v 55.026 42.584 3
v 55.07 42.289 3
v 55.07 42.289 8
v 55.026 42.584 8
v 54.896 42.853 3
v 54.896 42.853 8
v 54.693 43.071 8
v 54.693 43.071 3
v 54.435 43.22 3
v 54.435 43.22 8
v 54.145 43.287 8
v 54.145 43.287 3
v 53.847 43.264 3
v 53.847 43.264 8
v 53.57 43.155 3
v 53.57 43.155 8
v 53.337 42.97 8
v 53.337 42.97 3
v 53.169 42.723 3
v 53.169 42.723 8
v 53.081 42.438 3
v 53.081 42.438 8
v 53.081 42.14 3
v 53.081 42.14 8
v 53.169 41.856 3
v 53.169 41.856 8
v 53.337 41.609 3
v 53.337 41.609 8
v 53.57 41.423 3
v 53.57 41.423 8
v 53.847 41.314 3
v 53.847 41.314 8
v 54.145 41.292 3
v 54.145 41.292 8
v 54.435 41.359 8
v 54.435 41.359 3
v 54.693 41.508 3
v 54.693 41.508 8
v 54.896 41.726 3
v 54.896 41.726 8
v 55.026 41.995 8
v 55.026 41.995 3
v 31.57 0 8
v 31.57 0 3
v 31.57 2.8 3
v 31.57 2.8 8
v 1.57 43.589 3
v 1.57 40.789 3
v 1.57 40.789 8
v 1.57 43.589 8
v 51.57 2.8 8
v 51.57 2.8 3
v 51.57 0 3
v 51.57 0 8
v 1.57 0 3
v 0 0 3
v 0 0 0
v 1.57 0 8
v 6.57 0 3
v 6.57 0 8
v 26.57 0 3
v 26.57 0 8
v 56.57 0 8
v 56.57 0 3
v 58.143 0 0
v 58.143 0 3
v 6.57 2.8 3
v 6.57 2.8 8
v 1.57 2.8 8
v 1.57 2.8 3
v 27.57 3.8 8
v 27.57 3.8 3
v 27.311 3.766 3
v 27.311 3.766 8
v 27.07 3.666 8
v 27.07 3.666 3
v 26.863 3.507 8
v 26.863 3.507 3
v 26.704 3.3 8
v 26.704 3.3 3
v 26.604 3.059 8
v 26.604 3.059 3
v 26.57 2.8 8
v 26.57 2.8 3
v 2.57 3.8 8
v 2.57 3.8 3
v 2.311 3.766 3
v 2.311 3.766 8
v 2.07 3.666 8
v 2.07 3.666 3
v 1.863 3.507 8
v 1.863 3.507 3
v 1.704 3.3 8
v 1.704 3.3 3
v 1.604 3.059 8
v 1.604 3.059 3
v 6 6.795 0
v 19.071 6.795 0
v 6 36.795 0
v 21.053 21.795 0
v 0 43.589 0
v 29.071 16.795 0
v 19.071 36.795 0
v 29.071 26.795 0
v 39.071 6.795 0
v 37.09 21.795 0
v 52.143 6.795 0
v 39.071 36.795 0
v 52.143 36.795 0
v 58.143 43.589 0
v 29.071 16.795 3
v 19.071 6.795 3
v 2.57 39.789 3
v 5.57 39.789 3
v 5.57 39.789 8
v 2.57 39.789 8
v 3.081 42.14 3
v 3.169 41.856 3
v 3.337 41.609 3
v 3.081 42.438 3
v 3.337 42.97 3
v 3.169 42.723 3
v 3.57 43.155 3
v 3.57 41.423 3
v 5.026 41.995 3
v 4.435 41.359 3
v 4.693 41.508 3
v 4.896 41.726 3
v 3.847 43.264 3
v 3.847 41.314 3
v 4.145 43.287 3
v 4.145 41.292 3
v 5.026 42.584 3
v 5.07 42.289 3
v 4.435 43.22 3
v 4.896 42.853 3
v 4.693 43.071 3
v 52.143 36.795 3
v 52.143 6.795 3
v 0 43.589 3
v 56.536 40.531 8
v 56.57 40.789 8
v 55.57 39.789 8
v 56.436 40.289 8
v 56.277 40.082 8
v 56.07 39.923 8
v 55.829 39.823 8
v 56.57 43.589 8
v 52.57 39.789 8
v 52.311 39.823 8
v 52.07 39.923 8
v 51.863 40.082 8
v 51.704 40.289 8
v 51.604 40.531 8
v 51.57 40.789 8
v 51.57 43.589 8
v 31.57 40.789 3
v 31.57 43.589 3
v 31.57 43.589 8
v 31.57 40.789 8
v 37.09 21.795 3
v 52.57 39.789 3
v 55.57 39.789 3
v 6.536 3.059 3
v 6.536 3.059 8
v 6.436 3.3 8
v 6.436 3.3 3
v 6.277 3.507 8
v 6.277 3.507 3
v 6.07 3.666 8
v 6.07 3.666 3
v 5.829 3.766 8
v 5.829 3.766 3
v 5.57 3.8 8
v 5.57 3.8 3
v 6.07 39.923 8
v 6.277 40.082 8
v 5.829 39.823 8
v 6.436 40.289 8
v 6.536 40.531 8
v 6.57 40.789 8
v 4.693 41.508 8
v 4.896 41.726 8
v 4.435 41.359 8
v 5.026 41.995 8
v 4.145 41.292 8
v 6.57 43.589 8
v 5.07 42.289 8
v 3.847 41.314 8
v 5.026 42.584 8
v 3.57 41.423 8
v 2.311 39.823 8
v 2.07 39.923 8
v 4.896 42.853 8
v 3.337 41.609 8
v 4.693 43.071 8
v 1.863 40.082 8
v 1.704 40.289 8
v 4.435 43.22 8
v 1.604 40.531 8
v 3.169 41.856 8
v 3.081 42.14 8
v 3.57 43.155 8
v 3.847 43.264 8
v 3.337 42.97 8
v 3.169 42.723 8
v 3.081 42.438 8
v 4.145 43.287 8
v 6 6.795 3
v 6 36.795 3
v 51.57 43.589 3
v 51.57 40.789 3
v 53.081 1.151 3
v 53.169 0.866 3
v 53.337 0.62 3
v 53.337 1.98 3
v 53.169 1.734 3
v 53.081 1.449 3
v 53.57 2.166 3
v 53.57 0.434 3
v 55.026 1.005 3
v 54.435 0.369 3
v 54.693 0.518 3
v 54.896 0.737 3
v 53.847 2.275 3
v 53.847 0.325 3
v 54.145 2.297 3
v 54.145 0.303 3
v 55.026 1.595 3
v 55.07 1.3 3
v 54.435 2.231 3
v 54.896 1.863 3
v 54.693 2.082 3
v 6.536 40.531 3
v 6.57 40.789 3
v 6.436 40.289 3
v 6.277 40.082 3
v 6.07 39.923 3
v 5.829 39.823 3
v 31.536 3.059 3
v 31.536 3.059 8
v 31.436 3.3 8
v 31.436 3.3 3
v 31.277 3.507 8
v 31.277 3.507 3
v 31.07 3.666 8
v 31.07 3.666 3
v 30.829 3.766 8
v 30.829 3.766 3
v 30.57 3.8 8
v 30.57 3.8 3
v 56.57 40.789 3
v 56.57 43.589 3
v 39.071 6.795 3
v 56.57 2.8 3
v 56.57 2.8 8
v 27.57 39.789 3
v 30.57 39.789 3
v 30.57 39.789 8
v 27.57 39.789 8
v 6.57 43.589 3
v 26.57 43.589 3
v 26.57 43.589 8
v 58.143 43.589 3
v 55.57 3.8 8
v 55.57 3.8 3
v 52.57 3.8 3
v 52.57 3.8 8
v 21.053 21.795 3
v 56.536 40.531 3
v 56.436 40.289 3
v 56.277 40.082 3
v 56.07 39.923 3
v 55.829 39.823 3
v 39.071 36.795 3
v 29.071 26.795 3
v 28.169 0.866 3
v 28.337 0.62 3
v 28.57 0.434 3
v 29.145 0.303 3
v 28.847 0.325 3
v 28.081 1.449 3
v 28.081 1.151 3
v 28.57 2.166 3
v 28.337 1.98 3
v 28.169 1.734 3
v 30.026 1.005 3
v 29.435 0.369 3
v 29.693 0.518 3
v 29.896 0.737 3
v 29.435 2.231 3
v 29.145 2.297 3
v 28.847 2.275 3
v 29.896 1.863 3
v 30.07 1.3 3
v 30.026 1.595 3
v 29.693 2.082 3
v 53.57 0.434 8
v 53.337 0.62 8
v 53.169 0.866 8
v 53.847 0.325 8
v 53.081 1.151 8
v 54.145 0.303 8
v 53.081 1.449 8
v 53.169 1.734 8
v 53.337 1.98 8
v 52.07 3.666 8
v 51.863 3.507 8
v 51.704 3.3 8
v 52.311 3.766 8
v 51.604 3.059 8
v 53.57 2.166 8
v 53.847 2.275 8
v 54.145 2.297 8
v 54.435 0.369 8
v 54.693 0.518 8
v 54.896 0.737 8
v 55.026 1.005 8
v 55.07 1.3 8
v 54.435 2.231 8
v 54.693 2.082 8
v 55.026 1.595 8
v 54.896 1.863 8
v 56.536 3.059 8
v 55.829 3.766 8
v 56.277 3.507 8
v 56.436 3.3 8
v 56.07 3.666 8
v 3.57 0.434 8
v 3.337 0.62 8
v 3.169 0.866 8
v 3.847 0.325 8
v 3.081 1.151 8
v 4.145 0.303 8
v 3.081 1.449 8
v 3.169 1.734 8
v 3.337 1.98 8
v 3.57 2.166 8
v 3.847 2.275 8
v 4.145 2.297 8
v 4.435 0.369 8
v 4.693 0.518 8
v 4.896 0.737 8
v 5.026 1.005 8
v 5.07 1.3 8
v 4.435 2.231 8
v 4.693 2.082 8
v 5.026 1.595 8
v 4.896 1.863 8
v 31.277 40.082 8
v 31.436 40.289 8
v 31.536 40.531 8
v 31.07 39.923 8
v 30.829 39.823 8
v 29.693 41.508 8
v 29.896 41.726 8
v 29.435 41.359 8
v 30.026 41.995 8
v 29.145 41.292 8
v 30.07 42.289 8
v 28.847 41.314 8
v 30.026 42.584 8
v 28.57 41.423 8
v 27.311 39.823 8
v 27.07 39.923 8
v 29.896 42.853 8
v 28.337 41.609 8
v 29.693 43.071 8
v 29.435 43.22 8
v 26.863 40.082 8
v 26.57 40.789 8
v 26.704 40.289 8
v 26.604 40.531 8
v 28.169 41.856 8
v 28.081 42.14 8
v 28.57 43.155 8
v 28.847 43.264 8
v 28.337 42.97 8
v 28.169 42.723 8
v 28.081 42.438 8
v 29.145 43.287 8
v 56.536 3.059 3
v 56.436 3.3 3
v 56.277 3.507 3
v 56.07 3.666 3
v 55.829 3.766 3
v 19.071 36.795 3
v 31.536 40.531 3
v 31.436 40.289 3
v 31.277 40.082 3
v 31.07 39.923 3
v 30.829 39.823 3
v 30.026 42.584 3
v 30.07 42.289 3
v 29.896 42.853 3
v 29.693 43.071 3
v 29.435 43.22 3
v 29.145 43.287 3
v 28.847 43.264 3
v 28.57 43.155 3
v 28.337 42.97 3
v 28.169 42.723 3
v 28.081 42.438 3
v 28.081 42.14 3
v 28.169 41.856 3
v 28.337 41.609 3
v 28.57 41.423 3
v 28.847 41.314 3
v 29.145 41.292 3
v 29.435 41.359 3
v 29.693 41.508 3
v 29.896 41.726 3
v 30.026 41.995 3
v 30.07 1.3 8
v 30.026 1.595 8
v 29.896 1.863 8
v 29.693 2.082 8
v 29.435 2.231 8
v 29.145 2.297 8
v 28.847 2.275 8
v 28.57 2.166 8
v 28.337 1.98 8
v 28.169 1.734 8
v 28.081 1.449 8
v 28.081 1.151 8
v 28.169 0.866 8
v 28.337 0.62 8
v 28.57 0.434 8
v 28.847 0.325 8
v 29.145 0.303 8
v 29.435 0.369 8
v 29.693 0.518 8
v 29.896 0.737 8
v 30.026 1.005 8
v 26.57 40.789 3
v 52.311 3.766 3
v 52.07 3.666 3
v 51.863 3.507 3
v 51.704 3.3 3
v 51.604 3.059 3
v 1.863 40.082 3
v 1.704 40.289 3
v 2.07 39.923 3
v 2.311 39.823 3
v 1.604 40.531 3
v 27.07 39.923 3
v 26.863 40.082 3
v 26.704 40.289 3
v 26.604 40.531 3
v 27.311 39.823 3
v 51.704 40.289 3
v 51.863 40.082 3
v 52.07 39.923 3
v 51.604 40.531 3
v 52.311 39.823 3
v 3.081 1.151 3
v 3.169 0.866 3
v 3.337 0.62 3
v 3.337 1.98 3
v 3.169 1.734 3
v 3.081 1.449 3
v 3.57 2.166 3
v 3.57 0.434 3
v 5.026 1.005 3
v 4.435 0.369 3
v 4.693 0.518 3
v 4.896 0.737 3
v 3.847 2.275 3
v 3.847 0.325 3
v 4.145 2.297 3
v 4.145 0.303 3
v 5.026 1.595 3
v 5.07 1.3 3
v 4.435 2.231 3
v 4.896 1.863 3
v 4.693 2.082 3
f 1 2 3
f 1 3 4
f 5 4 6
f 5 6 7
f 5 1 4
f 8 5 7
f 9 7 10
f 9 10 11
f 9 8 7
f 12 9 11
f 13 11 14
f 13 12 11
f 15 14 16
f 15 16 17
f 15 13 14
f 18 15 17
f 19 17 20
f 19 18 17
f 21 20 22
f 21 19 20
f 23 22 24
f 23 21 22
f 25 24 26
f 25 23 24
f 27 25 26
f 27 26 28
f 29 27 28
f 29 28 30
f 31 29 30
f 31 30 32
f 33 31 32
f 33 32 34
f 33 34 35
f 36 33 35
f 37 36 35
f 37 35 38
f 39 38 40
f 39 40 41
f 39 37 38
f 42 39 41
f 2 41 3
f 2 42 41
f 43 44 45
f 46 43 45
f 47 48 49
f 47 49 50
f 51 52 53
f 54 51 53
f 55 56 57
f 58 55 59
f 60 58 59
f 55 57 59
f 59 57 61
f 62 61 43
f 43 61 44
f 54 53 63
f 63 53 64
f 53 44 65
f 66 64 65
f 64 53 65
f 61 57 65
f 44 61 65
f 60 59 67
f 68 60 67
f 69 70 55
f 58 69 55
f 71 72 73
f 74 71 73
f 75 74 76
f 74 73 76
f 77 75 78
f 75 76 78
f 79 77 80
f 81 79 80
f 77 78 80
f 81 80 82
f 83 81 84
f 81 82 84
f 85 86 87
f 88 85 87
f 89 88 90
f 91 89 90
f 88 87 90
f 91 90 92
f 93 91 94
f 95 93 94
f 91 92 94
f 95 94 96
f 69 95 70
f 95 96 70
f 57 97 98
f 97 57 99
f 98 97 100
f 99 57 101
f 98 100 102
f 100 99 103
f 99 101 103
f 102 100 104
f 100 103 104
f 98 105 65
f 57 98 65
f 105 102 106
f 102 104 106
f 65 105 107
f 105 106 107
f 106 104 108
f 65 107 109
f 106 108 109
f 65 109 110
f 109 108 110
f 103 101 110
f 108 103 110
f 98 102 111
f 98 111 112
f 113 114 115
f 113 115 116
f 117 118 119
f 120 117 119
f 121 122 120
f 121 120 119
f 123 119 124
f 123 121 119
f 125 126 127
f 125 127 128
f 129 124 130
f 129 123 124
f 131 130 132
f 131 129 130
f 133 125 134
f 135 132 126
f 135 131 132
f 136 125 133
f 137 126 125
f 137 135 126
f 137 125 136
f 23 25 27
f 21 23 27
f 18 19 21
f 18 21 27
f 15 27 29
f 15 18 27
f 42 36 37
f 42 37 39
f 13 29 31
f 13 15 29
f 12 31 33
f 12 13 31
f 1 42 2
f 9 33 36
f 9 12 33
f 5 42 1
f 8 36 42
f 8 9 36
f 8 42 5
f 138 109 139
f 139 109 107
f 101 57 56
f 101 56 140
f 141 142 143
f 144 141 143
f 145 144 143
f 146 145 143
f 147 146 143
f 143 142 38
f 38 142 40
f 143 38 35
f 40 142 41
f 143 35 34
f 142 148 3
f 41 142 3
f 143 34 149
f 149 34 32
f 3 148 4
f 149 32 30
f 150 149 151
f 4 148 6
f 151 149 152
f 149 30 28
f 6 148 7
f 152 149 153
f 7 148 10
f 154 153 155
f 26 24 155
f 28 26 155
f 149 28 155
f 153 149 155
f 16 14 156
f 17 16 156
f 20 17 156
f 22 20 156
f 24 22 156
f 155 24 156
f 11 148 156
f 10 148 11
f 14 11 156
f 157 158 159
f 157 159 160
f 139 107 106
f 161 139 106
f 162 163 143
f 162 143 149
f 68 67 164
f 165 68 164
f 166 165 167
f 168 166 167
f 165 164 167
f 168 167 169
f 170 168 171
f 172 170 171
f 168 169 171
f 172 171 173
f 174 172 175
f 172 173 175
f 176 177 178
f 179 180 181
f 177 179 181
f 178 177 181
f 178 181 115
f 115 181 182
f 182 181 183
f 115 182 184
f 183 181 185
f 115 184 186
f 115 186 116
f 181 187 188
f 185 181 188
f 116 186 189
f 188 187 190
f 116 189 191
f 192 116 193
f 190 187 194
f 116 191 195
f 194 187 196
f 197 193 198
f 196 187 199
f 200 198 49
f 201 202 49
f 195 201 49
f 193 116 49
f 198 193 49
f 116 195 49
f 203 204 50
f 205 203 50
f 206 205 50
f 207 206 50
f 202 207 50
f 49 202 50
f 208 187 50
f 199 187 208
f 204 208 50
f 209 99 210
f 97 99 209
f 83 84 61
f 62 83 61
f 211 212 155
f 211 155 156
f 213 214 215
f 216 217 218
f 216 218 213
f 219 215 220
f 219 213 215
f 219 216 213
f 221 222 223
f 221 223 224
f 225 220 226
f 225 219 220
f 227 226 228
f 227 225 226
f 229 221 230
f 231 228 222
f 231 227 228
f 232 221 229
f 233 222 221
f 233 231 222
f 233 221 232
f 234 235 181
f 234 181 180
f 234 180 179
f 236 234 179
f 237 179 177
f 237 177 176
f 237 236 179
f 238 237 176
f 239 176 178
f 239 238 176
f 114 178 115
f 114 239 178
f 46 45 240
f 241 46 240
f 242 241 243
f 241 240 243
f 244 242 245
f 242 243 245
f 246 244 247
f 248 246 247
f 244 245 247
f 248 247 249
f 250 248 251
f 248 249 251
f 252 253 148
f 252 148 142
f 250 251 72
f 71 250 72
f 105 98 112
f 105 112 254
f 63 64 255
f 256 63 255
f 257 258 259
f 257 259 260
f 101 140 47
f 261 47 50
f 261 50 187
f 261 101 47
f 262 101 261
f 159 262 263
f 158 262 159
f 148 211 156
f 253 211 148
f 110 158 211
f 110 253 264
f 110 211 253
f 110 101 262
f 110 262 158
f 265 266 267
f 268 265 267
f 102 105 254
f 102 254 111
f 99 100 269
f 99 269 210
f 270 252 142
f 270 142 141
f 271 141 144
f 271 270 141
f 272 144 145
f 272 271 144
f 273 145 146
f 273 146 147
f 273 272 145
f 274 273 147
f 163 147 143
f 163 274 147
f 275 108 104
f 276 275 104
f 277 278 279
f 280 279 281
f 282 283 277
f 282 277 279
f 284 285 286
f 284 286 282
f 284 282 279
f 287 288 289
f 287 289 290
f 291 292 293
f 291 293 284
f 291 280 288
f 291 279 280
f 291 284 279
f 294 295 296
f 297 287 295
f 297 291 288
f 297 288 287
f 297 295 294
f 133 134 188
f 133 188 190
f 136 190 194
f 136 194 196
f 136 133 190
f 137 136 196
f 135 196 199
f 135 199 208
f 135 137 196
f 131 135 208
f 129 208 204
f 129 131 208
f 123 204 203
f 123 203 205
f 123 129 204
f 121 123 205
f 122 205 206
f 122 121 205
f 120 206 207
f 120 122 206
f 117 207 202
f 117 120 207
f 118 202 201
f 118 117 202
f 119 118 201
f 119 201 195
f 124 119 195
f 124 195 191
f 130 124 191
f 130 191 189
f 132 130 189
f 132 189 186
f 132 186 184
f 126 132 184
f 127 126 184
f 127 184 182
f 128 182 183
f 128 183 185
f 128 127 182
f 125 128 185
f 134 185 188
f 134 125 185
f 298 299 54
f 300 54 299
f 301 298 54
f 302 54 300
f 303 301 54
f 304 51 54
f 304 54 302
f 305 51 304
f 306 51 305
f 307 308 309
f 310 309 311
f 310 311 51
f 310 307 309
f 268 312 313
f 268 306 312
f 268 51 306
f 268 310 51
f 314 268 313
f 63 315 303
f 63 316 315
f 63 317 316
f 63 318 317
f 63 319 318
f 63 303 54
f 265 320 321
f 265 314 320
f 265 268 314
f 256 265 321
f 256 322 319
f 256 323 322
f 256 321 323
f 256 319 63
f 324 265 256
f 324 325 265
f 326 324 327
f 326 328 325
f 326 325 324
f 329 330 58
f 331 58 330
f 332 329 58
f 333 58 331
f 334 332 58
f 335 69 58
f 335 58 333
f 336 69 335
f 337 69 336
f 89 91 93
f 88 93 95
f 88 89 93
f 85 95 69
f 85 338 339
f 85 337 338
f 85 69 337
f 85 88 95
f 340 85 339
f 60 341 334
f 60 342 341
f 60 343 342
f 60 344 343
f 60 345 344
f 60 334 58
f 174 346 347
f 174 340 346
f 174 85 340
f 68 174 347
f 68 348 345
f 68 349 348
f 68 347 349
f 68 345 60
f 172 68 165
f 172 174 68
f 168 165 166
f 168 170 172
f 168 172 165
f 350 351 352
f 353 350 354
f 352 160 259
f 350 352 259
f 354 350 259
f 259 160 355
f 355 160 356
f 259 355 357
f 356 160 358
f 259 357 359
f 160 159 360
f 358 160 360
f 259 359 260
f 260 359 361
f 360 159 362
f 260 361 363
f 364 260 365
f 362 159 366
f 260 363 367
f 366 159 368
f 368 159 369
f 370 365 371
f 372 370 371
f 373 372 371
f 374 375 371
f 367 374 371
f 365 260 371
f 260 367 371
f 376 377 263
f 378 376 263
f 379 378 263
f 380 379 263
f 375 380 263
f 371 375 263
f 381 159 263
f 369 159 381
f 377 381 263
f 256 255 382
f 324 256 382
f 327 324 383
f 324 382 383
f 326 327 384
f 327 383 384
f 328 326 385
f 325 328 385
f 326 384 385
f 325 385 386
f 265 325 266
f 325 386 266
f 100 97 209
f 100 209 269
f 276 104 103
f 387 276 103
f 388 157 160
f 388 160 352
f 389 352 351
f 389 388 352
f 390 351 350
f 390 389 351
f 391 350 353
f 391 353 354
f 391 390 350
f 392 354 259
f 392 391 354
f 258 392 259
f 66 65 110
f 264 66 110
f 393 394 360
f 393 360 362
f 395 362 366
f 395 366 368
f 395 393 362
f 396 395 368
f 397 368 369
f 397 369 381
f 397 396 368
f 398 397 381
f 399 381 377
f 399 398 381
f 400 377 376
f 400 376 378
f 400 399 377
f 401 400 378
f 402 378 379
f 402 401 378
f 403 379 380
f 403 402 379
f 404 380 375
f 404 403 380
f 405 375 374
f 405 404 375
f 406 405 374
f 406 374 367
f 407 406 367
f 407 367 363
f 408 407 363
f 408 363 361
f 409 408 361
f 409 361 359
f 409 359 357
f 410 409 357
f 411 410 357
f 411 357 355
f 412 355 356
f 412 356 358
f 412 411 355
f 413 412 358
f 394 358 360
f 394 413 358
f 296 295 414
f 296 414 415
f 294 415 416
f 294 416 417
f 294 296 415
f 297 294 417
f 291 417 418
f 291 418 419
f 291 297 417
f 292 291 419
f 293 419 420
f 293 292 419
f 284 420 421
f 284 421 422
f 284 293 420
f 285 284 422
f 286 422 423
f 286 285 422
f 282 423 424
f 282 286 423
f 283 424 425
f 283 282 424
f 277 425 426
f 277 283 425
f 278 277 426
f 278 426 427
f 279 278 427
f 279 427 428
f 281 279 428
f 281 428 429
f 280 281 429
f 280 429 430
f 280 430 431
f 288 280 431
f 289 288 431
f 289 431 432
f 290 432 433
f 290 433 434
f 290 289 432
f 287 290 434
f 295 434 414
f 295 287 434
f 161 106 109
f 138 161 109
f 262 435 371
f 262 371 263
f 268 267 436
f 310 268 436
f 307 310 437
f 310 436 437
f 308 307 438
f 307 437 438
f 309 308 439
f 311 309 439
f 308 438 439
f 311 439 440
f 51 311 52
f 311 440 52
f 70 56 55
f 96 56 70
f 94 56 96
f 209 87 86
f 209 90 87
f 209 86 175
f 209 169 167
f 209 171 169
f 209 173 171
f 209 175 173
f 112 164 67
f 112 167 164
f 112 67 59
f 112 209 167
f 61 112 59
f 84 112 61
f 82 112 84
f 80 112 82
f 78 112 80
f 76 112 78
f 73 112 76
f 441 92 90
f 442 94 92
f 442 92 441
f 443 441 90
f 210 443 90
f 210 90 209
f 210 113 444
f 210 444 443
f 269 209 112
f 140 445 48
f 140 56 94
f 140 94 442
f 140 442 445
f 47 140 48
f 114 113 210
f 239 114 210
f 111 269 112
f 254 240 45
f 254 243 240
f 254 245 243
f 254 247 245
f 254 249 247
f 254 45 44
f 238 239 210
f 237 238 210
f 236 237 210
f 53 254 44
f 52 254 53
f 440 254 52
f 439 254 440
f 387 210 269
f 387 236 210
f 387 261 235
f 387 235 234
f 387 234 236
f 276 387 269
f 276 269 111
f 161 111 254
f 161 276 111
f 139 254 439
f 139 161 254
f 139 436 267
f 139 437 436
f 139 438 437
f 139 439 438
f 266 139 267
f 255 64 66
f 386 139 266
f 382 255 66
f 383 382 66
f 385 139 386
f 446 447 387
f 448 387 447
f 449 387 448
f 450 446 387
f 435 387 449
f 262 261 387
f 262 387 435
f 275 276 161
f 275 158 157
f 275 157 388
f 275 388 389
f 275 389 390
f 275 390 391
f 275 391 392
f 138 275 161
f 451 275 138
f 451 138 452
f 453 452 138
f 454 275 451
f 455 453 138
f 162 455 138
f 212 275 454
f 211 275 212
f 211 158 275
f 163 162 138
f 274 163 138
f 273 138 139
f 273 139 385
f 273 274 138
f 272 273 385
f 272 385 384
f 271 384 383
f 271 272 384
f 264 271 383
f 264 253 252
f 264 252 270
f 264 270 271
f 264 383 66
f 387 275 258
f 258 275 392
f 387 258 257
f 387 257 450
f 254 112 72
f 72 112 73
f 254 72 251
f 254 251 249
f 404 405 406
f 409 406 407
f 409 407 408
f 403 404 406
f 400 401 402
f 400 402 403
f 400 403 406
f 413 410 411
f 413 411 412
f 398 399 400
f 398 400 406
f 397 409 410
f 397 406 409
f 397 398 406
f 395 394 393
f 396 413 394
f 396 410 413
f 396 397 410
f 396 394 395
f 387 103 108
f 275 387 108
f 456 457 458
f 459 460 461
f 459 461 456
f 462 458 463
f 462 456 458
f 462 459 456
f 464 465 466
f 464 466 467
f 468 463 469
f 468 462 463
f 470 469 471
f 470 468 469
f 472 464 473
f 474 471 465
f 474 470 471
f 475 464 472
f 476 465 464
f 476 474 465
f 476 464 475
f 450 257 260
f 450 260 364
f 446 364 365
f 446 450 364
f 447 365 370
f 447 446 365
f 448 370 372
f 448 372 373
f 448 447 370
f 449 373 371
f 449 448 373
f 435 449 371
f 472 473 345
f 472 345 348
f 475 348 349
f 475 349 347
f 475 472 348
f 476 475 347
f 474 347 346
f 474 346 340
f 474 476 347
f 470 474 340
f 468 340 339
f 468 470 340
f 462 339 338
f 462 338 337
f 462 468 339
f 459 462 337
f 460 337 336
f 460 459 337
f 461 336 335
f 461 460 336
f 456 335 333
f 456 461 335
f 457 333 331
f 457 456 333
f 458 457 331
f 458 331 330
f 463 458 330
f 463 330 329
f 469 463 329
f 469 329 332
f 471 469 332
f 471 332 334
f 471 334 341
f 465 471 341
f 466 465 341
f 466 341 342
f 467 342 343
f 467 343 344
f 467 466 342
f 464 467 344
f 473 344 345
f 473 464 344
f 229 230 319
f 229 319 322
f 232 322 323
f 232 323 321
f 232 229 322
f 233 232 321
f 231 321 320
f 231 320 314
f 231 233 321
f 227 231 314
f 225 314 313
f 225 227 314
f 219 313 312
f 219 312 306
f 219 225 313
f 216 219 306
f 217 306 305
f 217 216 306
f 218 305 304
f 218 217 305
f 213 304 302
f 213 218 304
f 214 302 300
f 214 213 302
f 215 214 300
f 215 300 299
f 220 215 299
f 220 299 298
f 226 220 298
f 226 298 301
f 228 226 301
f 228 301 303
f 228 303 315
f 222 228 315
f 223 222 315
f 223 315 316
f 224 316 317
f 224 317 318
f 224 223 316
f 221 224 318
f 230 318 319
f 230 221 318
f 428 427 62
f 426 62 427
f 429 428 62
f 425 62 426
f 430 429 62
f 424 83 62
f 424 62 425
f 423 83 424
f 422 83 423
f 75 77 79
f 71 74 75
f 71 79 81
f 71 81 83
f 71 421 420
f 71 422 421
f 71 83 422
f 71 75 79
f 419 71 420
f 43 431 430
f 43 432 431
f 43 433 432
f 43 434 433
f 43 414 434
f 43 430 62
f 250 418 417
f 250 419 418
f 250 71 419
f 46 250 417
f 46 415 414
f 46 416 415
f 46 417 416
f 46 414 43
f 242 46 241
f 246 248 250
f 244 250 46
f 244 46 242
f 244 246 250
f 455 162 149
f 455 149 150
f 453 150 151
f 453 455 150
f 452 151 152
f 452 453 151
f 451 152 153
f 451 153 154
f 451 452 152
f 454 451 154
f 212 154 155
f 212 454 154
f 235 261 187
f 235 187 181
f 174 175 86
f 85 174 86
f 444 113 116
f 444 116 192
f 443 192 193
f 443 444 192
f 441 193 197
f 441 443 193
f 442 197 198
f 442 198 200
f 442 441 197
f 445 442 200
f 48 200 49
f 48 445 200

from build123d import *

# Parameters (mm, degrees)
SKETCH1_W           = 58.1426
SKETCH1_H           = 43.5894
BOSS_EXTRUDE1_DEPTH = 3
SKETCH2_R           = 1
BOSS_EXTRUDE2_DEPTH = 5


with BuildPart() as part:
    # Sketch1 → Boss-Extrude1 (new body)
    with BuildSketch(Plane.XY):
        with Locations((29.0713, 21.7947)):
            Rectangle(SKETCH1_W, SKETCH1_H)
        Polygon((6, 36.7947), (6, 6.7947), (21.0529, 21.7947), align=None, mode=Mode.SUBTRACT)
        Polygon((39.0713, 6.7947), (29.0713, 16.7947), (19.0713, 6.7947), align=None, mode=Mode.SUBTRACT)
        Polygon((52.1426, 36.7947), (52.1426, 6.7947), (37.0897, 21.7947), align=None, mode=Mode.SUBTRACT)
        Polygon((19.0713, 36.7947), (39.0713, 36.7947), (29.0713, 26.7947), align=None, mode=Mode.SUBTRACT)
    extrude(amount=BOSS_EXTRUDE1_DEPTH)

    # Sketch2 → Boss-Extrude2 (add)
    with BuildSketch(Plane.XY.offset(3)):
        with BuildLine():
            Line((1.57, 43.5894), (6.57, 43.5894))
            Line((6.57, 43.5894), (6.57, 40.7894))
            ThreePointArc((6.57, 40.7894), (6.277106781, 40.082293219), (5.57, 39.7894))
            Line((5.57, 39.7894), (2.57, 39.7894))
            ThreePointArc((2.57, 39.7894), (1.862893219, 40.082293219), (1.57, 40.7894))
            Line((1.57, 40.7894), (1.57, 43.5894))
        make_face()
        with Locations((4.07, 42.2894)):
            Circle(SKETCH2_R, mode=Mode.SUBTRACT)
        with BuildLine():
            Line((26.57, 43.5894), (31.57, 43.5894))
            Line((31.57, 43.5894), (31.57, 40.7894))
            ThreePointArc((31.57, 40.7894), (31.277106781, 40.082293219), (30.57, 39.7894))
            Line((30.57, 39.7894), (27.57, 39.7894))
            ThreePointArc((27.57, 39.7894), (26.862893219, 40.082293219), (26.57, 40.7894))
            Line((26.57, 40.7894), (26.57, 43.5894))
        make_face()
        with Locations((29.07, 42.2894)):
            Circle(SKETCH2_R, mode=Mode.SUBTRACT)
        with BuildLine():
            Line((51.57, 43.5894), (56.57, 43.5894))
            Line((56.57, 43.5894), (56.57, 40.7894))
            ThreePointArc((56.57, 40.7894), (56.277106781, 40.082293219), (55.57, 39.7894))
            Line((55.57, 39.7894), (52.57, 39.7894))
            ThreePointArc((52.57, 39.7894), (51.862893219, 40.082293219), (51.57, 40.7894))
            Line((51.57, 40.7894), (51.57, 43.5894))
        make_face()
        with Locations((54.07, 42.2894)):
            Circle(SKETCH2_R, mode=Mode.SUBTRACT)
        with BuildLine():
            Line((56.57, 0), (56.57, 2.8))
            ThreePointArc((56.57, 2.8), (56.277106781, 3.507106781), (55.57, 3.8))
            Line((55.57, 3.8), (52.57, 3.8))
            ThreePointArc((52.57, 3.8), (51.862893219, 3.507106781), (51.57, 2.8))
            Line((51.57, 2.8), (51.57, 0))
            Line((51.57, 0), (56.57, 0))
        make_face()
        with Locations((54.07, 1.3)):
            Circle(SKETCH2_R, mode=Mode.SUBTRACT)
        with BuildLine():
            Line((31.57, 0), (31.57, 2.8))
            ThreePointArc((31.57, 2.8), (31.277106781, 3.507106781), (30.57, 3.8))
            Line((30.57, 3.8), (27.57, 3.8))
            ThreePointArc((27.57, 3.8), (26.862893219, 3.507106781), (26.57, 2.8))
            Line((26.57, 2.8), (26.57, 0))
            Line((26.57, 0), (31.57, 0))
        make_face()
        with Locations((29.07, 1.3)):
            Circle(SKETCH2_R, mode=Mode.SUBTRACT)
        with BuildLine():
            Line((6.57, 0), (6.57, 2.8))
            ThreePointArc((6.57, 2.8), (6.277106781, 3.507106781), (5.57, 3.8))
            Line((5.57, 3.8), (2.57, 3.8))
            ThreePointArc((2.57, 3.8), (1.862893219, 3.507106781), (1.57, 2.8))
            Line((1.57, 2.8), (1.57, 0))
            Line((1.57, 0), (6.57, 0))
        make_face()
        with Locations((4.07, 1.3)):
            Circle(SKETCH2_R, mode=Mode.SUBTRACT)
    extrude(amount=BOSS_EXTRUDE2_DEPTH)


solid = part.part
